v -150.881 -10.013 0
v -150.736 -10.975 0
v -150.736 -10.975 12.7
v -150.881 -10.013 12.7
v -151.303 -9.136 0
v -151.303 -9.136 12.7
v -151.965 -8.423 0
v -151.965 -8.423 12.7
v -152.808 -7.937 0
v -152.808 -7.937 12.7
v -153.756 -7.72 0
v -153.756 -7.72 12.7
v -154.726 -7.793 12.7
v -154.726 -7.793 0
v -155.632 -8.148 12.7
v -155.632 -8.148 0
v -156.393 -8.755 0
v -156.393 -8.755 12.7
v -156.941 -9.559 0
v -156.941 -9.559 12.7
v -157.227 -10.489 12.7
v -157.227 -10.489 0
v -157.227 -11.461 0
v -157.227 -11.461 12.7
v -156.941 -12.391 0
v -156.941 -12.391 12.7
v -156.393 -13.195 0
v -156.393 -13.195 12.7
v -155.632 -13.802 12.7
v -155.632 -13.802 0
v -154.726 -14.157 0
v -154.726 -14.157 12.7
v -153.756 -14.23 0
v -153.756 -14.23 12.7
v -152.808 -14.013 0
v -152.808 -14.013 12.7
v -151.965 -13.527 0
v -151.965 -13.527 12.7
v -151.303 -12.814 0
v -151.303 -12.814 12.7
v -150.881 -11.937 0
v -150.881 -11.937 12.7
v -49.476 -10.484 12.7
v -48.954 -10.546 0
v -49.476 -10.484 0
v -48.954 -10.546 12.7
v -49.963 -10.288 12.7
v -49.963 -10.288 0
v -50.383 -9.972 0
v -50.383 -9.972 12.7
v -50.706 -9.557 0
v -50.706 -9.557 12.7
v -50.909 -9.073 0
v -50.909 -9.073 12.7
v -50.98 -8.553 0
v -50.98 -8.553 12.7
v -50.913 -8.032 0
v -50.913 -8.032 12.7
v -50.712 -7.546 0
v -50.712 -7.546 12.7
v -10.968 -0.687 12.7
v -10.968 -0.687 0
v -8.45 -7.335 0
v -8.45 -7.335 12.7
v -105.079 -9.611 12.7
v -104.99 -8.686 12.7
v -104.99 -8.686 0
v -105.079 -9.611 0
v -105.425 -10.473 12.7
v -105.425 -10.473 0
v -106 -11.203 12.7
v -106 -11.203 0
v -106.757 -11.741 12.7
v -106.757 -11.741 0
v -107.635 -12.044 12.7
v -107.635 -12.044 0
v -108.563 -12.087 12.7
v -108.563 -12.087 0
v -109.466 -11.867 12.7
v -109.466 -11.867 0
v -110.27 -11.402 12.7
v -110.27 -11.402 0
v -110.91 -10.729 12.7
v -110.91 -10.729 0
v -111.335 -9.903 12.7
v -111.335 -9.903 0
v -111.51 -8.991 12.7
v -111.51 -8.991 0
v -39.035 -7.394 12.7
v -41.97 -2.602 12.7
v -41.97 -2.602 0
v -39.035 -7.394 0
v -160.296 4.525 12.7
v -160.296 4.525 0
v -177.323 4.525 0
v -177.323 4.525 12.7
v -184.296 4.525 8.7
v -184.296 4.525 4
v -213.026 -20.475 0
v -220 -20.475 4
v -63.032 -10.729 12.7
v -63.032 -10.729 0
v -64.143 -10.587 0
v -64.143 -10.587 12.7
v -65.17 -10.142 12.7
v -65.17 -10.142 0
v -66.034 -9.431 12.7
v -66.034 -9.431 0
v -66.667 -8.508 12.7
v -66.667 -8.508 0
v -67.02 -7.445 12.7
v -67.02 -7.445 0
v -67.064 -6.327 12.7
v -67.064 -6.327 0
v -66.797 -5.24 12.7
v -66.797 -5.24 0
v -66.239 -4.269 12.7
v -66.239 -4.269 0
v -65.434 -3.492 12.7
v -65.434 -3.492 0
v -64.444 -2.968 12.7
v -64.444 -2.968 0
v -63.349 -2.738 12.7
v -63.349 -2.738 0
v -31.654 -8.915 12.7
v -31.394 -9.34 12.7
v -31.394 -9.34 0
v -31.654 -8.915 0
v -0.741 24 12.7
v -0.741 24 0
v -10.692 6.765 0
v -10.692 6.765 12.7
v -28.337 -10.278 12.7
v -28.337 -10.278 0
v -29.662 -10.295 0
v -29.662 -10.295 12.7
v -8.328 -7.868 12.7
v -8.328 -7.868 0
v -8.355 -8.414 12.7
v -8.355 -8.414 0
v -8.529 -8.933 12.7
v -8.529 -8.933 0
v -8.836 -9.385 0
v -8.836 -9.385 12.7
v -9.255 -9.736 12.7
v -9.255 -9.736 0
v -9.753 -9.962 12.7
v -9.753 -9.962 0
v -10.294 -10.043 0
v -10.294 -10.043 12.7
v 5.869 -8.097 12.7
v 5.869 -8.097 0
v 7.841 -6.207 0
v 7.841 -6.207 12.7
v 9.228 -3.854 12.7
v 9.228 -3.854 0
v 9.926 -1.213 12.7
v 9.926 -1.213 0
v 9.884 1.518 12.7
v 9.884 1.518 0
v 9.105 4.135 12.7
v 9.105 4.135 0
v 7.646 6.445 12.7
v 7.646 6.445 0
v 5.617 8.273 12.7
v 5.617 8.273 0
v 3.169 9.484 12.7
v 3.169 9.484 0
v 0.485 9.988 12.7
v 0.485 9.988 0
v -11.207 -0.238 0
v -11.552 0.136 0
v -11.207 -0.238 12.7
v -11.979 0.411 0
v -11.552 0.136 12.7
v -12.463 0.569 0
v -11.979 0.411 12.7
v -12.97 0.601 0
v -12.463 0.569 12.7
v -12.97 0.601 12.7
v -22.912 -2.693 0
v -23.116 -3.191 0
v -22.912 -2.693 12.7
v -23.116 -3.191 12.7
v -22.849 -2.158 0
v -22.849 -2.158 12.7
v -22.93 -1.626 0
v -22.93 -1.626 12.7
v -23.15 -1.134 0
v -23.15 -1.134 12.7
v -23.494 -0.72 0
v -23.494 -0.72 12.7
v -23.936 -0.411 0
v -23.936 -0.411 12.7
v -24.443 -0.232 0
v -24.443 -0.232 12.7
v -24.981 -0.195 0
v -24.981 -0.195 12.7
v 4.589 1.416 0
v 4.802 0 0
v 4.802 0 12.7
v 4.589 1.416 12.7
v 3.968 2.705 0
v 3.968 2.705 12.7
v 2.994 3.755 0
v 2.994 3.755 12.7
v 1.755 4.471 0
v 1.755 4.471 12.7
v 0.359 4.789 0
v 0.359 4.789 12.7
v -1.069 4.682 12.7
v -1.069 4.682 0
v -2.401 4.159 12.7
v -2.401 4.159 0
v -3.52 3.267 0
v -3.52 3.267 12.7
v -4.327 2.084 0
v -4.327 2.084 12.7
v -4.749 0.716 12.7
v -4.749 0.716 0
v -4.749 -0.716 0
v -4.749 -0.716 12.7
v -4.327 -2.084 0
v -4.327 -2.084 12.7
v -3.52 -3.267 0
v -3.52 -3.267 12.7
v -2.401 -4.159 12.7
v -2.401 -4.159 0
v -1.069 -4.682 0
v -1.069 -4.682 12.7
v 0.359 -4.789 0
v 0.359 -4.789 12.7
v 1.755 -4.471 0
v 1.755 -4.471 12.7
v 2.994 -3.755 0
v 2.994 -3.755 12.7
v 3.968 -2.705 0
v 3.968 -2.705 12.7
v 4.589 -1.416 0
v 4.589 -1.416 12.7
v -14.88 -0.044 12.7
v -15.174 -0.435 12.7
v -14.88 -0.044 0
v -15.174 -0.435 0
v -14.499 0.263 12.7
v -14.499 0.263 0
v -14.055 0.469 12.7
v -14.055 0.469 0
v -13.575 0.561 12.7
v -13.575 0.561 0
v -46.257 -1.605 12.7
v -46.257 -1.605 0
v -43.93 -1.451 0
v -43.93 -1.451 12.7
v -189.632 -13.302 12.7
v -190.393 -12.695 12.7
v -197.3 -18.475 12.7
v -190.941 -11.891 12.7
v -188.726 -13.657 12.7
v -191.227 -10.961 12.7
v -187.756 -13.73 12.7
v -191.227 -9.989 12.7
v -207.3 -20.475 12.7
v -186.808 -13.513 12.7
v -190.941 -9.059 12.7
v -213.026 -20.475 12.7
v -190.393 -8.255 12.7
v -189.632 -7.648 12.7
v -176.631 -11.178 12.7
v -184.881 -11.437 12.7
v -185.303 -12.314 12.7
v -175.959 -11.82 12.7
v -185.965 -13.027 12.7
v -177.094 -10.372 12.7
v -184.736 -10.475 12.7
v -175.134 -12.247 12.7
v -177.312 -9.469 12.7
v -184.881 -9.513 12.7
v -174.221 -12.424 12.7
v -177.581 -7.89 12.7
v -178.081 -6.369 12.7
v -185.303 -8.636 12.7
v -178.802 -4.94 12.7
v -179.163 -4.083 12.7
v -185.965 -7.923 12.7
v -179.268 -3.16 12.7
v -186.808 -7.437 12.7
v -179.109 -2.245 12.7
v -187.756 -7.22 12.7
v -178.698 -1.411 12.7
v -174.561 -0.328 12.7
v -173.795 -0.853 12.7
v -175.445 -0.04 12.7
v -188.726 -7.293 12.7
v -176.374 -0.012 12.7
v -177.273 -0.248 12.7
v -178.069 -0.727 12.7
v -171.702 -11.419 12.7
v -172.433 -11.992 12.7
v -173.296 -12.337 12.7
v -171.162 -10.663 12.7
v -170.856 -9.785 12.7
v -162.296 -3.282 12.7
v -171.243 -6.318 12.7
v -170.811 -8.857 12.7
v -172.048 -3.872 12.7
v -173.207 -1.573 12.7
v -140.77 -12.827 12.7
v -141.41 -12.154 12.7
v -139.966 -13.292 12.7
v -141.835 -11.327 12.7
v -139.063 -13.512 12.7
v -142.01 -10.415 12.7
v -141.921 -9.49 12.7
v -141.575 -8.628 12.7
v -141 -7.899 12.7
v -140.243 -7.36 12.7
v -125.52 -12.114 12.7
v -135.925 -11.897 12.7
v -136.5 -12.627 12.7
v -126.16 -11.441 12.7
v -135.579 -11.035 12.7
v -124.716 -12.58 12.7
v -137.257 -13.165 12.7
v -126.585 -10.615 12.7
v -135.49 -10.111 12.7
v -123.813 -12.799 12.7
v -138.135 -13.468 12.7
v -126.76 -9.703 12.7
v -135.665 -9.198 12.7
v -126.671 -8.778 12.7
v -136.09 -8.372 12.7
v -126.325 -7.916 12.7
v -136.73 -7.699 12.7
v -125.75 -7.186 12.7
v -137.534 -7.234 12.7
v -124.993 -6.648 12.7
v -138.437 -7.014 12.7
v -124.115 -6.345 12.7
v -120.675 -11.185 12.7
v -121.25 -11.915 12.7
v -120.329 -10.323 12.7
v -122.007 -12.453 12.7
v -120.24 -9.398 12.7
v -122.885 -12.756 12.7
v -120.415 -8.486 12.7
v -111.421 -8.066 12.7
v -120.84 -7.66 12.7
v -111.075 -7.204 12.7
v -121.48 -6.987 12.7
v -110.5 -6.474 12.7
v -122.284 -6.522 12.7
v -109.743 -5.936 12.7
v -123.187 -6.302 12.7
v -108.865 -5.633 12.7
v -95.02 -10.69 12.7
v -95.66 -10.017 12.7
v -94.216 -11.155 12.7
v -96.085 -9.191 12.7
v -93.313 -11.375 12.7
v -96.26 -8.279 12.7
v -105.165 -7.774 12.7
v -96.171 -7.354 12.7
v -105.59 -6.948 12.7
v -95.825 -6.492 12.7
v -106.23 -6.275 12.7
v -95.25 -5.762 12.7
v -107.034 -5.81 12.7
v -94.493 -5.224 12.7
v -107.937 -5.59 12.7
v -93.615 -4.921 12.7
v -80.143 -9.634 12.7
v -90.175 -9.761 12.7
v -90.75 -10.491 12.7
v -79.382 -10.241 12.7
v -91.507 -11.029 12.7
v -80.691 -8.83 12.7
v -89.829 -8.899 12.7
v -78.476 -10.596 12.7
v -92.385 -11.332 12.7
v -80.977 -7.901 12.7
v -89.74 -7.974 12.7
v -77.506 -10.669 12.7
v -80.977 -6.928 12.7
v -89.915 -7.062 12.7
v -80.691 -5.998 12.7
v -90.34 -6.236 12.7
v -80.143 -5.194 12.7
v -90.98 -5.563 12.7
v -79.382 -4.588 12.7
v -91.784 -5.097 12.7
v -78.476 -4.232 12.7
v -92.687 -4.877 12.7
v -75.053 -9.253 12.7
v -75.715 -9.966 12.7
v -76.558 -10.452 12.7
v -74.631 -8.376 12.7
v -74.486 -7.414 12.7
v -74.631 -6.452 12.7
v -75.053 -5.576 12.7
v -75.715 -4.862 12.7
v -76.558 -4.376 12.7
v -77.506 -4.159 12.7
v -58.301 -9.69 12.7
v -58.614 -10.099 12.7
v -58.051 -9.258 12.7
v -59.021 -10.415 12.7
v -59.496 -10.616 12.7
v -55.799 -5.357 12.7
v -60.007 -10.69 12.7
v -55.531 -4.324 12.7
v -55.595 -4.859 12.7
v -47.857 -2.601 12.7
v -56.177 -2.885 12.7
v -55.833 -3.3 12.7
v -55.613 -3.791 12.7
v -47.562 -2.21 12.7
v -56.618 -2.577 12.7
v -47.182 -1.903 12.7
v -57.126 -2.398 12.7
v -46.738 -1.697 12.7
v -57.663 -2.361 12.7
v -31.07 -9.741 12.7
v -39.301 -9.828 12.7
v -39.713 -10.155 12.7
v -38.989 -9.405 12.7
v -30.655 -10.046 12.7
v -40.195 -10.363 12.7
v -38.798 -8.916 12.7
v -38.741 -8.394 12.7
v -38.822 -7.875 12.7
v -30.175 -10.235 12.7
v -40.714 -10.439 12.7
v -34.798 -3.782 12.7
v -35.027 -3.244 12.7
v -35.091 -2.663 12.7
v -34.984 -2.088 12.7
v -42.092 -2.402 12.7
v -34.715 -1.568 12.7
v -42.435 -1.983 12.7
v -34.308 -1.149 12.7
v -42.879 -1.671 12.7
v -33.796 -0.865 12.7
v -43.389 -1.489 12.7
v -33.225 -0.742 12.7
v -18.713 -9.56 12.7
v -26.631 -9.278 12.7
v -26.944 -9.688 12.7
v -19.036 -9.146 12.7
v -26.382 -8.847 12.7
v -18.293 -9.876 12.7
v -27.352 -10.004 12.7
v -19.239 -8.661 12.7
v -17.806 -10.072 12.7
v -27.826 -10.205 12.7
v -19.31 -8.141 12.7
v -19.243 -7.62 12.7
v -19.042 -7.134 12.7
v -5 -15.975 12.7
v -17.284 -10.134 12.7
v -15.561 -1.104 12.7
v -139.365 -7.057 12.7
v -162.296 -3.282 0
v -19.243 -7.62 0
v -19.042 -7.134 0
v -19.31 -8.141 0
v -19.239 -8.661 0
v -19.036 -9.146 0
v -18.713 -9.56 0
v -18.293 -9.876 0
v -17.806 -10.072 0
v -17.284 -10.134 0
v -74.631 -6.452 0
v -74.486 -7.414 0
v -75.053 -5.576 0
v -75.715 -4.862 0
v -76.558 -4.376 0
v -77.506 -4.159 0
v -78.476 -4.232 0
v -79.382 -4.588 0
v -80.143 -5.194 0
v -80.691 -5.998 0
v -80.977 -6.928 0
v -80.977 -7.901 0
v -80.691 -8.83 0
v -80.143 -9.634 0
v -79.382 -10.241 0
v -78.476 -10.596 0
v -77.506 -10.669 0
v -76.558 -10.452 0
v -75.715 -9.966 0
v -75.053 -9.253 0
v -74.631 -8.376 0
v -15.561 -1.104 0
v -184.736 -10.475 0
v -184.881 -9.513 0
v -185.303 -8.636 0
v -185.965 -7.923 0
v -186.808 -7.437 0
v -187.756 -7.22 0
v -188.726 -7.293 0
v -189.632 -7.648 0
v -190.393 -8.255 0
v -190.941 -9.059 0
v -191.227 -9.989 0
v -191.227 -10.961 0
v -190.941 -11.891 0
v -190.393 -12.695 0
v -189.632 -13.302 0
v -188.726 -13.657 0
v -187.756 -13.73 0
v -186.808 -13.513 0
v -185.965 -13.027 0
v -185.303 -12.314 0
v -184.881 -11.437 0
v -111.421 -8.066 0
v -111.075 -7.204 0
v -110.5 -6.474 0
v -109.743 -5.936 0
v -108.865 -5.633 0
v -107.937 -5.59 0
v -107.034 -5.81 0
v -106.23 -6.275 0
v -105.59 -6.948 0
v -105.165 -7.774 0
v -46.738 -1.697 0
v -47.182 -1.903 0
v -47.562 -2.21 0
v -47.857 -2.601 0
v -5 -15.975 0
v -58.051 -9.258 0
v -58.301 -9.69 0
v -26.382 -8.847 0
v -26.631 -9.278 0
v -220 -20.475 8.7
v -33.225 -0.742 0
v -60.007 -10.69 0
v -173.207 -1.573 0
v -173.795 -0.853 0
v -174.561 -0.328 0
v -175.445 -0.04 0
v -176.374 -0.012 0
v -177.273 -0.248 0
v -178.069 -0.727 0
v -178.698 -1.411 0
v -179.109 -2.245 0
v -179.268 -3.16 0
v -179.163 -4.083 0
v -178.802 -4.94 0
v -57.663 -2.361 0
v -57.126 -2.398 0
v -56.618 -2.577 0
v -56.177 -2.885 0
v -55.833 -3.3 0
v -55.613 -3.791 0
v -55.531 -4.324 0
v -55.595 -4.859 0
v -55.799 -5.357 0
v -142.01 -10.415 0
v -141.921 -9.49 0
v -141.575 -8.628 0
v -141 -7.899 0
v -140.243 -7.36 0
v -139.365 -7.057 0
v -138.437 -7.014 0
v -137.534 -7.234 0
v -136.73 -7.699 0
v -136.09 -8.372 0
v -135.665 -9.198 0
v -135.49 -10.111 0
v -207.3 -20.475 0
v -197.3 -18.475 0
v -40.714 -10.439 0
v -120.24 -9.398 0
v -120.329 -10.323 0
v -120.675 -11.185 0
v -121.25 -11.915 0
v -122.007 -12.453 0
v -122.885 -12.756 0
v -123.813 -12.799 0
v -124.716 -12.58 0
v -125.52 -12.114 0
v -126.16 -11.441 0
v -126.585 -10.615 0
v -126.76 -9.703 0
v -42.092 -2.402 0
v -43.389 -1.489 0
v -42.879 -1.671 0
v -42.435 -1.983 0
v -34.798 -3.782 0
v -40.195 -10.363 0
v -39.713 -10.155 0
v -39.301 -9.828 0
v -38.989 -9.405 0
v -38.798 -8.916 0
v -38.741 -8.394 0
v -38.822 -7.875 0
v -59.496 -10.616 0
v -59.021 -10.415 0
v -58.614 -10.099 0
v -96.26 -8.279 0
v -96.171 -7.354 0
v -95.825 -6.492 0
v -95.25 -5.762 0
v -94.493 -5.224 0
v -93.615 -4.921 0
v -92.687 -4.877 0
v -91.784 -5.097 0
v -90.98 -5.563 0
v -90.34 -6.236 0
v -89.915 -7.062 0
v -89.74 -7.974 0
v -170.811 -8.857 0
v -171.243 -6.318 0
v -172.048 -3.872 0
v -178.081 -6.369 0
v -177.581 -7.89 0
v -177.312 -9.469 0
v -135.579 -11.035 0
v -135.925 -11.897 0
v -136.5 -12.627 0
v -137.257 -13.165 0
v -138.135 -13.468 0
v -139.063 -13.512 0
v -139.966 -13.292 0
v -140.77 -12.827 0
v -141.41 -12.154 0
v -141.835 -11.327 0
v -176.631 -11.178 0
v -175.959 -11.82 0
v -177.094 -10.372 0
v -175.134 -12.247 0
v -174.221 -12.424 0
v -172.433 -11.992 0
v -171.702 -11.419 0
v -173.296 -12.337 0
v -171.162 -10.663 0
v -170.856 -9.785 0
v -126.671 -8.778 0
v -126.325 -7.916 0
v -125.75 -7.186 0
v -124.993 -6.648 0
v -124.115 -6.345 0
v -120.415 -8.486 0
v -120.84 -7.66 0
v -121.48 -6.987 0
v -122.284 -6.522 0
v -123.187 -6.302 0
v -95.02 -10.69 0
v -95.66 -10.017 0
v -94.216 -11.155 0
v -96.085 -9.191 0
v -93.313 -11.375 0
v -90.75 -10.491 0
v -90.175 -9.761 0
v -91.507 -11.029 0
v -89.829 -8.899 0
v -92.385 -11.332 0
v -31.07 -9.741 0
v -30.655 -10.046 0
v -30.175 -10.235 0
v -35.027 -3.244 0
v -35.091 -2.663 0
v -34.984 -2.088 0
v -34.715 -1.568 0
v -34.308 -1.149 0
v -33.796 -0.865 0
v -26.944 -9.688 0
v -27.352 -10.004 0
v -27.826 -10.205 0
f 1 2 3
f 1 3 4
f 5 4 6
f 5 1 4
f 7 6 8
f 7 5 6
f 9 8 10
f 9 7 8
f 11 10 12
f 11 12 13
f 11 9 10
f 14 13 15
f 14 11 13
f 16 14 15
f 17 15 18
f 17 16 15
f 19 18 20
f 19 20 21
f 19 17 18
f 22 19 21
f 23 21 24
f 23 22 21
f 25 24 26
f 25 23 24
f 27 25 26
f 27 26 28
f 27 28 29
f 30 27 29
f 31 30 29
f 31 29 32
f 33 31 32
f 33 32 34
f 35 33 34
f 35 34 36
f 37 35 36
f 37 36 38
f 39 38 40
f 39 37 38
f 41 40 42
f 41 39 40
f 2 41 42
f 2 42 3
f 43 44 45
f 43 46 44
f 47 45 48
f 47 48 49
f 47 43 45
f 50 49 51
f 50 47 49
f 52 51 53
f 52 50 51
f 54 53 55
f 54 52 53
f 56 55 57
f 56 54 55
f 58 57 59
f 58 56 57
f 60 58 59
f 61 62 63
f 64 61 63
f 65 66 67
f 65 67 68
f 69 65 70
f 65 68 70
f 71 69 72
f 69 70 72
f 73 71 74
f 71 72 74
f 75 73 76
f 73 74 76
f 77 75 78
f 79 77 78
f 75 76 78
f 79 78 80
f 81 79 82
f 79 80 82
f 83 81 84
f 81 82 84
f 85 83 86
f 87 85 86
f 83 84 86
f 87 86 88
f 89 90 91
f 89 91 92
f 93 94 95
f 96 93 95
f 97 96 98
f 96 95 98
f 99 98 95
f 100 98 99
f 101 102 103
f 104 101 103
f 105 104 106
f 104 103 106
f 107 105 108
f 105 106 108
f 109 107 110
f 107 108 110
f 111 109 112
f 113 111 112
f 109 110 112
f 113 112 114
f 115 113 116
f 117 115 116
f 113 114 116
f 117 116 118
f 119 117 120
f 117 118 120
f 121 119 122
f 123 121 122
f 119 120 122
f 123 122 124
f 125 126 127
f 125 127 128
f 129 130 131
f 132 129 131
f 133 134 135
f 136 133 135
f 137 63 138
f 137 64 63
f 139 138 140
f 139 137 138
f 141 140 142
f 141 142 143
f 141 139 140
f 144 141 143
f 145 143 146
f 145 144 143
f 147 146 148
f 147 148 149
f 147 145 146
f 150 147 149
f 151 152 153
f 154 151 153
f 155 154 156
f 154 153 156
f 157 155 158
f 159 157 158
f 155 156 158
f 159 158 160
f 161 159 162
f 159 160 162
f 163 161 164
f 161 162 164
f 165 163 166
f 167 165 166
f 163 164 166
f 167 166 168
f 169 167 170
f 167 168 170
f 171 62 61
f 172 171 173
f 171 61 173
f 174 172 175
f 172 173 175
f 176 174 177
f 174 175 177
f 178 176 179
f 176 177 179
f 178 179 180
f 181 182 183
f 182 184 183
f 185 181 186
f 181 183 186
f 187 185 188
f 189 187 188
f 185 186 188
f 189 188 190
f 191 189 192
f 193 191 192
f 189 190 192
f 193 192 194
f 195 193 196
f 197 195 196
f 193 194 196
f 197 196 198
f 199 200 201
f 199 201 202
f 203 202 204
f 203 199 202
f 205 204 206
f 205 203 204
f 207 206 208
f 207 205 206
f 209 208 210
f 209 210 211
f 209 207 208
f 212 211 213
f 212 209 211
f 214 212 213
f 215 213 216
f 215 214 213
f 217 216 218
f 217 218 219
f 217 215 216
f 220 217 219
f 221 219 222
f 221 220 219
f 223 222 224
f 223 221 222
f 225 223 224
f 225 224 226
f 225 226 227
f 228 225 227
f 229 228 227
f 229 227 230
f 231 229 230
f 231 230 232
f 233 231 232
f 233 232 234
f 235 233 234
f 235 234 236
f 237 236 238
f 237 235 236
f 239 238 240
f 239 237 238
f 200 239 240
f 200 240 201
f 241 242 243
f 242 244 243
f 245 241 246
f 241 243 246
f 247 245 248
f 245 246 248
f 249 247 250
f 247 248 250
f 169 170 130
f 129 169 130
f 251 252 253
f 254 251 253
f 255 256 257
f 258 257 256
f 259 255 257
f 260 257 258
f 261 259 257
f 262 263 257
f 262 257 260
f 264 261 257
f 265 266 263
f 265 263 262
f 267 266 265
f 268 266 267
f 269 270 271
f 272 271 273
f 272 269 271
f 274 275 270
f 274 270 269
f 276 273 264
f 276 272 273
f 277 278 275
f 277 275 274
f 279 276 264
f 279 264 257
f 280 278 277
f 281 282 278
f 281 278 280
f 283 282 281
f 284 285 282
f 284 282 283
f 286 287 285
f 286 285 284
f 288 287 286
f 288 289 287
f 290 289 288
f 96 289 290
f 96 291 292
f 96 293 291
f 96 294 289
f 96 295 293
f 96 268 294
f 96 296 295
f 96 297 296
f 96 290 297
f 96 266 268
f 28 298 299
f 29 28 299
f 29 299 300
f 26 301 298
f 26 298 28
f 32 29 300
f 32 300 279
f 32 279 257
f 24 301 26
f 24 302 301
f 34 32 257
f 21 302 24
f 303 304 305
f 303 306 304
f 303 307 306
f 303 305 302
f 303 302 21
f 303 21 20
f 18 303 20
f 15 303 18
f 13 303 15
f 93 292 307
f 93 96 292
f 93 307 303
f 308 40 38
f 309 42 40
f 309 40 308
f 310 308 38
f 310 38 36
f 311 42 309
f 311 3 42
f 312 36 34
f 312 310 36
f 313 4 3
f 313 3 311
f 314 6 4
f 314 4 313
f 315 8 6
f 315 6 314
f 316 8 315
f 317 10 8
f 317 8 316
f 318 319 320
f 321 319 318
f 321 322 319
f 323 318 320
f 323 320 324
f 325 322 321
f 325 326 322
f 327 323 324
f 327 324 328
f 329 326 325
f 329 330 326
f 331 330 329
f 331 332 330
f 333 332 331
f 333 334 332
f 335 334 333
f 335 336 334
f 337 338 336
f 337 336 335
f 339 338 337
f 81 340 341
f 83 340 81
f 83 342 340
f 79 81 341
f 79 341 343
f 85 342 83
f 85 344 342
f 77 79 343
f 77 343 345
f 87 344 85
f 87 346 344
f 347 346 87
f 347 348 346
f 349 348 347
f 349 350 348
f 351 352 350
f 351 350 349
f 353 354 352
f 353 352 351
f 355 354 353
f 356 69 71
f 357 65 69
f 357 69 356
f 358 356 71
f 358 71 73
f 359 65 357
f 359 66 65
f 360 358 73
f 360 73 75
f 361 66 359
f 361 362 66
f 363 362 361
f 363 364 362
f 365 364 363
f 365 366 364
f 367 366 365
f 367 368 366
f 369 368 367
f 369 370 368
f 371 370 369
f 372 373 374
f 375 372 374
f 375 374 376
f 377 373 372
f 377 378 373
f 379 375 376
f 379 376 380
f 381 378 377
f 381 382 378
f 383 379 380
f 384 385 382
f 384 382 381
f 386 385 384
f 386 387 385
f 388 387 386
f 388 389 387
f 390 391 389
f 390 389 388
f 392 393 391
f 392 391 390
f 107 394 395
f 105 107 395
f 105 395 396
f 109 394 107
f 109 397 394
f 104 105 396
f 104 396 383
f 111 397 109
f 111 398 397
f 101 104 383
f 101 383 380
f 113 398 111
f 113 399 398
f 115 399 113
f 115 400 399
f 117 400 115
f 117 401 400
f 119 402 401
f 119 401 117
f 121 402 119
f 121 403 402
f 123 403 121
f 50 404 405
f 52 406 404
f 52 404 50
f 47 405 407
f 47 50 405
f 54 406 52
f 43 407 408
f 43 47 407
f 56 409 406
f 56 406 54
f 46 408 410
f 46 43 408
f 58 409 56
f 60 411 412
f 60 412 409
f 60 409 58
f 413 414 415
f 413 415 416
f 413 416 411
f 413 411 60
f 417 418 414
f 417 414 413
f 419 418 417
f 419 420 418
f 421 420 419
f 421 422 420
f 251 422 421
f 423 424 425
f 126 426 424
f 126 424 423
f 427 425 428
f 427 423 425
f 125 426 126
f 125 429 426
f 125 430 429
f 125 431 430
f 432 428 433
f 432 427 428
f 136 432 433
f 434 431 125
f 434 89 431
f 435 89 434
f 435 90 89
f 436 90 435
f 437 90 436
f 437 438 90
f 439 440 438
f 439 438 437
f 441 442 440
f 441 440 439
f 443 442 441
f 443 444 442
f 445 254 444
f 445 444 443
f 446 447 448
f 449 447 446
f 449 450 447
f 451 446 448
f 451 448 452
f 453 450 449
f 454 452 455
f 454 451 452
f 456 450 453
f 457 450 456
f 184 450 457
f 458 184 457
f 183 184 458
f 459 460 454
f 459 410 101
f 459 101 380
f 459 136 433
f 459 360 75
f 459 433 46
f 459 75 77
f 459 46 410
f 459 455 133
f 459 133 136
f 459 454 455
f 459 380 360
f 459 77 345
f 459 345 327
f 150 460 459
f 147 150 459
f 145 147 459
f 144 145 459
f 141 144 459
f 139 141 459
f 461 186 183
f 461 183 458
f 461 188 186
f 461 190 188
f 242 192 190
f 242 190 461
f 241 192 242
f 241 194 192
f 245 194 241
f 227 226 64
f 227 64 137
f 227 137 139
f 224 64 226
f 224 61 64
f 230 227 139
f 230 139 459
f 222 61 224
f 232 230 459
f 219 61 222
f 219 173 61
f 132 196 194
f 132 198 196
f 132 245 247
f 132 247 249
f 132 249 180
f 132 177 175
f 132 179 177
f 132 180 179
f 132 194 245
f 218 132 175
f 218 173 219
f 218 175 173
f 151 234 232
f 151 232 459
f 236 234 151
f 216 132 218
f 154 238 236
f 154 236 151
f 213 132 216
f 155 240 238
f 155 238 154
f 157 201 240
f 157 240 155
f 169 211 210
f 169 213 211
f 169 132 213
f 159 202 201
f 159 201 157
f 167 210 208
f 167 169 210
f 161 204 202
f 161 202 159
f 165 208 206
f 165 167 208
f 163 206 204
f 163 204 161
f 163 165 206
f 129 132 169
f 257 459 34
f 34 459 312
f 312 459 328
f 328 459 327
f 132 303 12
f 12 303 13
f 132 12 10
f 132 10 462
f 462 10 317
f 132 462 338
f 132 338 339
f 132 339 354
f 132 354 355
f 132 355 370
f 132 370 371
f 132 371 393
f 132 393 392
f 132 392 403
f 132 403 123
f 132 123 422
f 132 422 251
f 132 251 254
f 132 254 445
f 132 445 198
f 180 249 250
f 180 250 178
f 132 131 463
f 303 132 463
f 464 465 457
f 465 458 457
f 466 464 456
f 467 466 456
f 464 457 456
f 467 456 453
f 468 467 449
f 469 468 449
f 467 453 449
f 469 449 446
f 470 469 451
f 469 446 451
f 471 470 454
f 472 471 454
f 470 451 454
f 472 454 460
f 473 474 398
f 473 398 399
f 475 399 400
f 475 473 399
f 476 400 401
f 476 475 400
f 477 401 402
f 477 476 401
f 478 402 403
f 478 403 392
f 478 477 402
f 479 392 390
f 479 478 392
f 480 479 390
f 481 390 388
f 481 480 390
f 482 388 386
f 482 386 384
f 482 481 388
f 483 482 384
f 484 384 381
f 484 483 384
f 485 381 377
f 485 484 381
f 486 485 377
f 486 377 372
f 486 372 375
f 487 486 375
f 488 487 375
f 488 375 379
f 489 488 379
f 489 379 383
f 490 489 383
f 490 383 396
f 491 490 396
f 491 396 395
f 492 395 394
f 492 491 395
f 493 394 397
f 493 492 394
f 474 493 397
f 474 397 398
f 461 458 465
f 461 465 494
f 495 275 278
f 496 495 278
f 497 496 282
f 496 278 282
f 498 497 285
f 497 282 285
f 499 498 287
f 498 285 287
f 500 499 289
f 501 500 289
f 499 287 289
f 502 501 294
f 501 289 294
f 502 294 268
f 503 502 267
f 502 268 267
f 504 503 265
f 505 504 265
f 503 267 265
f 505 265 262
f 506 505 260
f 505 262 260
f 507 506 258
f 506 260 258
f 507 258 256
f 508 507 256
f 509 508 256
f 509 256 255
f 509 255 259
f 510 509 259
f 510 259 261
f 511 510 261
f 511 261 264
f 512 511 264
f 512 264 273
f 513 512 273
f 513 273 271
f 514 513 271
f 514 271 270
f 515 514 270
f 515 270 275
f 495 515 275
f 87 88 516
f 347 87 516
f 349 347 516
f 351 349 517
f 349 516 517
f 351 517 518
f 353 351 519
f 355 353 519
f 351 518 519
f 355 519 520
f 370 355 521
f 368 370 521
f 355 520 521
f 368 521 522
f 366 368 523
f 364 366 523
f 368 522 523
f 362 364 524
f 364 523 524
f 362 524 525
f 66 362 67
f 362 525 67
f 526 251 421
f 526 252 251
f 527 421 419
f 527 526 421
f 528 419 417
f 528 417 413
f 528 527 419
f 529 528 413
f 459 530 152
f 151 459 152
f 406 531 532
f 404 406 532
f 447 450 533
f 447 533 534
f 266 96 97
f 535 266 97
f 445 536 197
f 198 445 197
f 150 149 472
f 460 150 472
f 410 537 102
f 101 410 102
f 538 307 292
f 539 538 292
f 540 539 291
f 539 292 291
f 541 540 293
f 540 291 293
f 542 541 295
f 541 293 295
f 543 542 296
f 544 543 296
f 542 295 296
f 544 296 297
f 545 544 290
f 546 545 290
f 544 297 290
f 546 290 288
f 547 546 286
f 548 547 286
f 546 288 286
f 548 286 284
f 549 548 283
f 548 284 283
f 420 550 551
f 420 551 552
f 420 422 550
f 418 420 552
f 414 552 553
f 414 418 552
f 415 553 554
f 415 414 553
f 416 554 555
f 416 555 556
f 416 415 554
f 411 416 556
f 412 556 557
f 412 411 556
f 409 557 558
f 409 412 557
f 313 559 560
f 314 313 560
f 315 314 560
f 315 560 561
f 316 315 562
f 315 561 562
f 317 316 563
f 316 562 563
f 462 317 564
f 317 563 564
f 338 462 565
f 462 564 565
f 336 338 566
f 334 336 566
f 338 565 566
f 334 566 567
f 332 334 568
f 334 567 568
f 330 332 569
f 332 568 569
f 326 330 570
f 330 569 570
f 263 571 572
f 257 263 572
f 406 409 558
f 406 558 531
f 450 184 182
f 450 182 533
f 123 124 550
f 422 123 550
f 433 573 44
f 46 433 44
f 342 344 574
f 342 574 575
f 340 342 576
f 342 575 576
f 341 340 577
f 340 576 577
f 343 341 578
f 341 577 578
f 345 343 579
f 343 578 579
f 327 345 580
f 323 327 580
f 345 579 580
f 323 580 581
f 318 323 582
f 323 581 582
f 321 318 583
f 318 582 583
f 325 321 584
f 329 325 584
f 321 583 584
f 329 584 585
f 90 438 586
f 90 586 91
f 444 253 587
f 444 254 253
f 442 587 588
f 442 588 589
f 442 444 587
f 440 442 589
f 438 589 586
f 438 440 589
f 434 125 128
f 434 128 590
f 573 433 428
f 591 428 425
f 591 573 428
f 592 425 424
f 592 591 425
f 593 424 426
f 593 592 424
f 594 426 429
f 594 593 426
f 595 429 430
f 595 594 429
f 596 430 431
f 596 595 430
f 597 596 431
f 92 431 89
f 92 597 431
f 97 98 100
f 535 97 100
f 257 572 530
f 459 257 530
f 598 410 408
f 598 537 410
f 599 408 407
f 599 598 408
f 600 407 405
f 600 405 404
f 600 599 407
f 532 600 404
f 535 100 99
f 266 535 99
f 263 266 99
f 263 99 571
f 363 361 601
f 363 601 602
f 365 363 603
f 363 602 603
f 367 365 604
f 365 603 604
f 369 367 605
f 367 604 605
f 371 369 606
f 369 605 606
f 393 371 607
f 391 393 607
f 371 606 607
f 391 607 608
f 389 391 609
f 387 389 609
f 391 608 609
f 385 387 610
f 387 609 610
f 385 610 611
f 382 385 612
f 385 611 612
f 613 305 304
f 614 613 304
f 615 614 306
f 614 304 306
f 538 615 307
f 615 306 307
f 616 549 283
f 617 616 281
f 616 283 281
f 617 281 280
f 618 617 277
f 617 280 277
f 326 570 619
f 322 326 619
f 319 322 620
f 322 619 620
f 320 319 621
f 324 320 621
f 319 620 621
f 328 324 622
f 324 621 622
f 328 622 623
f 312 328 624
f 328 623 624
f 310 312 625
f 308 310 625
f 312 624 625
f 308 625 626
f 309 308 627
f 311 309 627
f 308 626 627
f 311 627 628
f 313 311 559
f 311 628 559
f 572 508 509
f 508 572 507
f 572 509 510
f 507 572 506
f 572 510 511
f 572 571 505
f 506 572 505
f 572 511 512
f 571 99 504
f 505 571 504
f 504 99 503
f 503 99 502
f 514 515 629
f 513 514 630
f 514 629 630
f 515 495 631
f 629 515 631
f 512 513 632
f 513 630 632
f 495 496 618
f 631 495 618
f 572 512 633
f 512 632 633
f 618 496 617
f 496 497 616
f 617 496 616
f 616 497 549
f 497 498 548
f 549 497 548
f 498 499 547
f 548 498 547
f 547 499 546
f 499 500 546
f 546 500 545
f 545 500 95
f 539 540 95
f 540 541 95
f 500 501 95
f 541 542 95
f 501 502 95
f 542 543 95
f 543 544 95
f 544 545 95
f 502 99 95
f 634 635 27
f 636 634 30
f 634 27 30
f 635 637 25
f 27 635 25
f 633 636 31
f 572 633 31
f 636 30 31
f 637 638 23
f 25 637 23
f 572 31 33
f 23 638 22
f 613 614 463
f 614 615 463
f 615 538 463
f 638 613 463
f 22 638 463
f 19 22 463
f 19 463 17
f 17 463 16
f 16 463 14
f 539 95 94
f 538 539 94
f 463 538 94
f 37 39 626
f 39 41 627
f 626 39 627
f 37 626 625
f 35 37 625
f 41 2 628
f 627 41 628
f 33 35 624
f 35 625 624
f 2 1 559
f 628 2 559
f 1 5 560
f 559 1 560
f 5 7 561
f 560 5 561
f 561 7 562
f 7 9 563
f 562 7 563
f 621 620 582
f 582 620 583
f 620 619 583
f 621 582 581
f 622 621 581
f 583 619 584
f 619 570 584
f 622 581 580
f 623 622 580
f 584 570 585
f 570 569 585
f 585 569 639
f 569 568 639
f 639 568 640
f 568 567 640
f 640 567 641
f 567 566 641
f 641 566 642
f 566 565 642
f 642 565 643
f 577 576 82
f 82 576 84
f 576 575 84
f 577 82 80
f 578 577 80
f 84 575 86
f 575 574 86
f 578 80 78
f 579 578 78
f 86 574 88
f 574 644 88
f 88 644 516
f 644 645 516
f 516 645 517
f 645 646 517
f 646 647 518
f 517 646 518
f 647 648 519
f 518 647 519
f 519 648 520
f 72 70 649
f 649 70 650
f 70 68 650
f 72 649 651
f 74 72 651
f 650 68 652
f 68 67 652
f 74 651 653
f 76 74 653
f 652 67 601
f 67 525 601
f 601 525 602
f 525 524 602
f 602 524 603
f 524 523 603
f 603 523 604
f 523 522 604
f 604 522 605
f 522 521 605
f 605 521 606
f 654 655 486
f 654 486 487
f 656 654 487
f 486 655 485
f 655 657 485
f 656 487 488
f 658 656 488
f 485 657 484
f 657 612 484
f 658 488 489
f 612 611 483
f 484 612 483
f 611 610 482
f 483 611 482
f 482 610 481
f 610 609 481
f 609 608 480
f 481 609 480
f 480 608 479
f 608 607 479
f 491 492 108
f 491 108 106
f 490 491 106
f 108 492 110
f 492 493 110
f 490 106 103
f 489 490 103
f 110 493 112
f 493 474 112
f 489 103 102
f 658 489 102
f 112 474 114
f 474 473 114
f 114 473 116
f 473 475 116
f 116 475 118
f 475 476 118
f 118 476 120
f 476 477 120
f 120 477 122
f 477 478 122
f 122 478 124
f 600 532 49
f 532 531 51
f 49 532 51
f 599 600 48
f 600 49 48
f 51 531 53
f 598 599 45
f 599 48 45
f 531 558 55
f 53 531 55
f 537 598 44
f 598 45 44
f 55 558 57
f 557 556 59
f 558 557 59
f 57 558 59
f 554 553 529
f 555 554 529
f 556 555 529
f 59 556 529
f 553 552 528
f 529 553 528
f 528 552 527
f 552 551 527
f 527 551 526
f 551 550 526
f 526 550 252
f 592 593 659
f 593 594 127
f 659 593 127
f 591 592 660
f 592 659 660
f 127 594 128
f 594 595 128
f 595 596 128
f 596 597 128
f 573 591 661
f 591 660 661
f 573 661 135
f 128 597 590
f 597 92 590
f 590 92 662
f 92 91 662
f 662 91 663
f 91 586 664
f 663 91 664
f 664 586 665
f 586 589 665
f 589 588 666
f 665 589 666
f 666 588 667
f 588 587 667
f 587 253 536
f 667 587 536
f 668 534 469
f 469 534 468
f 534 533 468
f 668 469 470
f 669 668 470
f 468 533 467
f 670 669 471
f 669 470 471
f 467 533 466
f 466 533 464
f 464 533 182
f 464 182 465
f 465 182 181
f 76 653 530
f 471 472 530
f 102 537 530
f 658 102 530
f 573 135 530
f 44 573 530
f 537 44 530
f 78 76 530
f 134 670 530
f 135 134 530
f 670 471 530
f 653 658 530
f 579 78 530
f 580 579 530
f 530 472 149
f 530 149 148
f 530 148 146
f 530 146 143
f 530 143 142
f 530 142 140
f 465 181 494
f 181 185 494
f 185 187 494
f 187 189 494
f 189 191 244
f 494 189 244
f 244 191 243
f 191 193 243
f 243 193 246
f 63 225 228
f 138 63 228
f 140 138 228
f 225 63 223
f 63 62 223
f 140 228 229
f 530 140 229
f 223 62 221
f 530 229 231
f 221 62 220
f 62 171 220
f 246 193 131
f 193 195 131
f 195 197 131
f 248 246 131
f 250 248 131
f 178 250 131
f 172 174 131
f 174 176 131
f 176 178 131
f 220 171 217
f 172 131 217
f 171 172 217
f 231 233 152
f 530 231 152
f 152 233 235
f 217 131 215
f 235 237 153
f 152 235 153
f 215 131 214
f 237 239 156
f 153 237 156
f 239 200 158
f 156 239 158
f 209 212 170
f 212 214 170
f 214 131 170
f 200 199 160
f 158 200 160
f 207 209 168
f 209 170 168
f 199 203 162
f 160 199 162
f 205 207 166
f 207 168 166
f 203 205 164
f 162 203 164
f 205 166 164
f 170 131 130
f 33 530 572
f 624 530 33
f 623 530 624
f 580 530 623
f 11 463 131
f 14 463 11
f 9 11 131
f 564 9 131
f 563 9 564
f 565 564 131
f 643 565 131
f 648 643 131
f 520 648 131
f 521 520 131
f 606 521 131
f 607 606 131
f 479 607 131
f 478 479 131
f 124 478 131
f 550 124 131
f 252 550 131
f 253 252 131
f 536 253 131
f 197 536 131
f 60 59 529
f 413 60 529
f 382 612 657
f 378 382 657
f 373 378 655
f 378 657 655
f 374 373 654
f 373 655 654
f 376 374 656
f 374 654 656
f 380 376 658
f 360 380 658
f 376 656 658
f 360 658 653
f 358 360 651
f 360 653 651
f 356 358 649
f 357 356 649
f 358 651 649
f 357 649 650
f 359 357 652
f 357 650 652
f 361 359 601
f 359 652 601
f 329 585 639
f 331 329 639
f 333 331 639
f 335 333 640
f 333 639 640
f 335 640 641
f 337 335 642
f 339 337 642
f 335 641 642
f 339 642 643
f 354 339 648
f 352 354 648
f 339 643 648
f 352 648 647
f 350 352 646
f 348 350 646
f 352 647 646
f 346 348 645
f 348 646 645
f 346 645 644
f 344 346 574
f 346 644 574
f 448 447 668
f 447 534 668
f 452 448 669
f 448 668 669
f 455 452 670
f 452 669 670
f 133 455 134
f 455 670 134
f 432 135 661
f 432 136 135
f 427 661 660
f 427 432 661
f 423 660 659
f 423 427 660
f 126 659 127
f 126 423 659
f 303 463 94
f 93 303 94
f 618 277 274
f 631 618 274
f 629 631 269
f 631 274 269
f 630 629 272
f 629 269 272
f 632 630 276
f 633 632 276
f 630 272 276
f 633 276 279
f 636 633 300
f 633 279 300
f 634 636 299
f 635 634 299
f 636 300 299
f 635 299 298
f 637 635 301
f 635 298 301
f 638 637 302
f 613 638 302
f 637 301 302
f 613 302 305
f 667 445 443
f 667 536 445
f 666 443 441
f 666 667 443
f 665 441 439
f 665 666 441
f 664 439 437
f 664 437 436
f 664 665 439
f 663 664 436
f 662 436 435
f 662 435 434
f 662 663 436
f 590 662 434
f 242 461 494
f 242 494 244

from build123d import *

# Parameters (mm, degrees)
SKETCH1_R           = 3.2639
SKETCH1_R_2         = 4.8025
BOSS_EXTRUDE1_DEPTH = 12.7
EXTRUDE_THIN1_DEPTH = 12.7
FILLET1_R           = 2
SKETCH3_R           = 3.2639
CUT_EXTRUDE1_DEPTH  = 222.669325799
CHAMFER1_SIZE       = 4


with BuildPart() as part:
    # Sketch1 → Boss-Extrude1 (new body)
    with BuildSketch(Plane.XY):
        with BuildLine():
            Line((-220, -20.475), (-207.3, -20.475))
            Line((-207.3, -20.475), (-197.3, -18.475))
            Line((-197.3, -18.475), (-5, -15.975))
            Line((-5, -15.975), (5.868885021, -8.096677628))
            ThreePointArc((5.868885021, -8.096677628), (9.584297561, 2.85328587), (0.484930071, 9.988235221))
            Line((0.484930071, 9.988235221), (-0.740940503, 24))
            Line((-0.740940503, 24), (-10.691733631, 6.764720727))
            Line((-10.691733631, 6.764720727), (-162.296299831, -3.282137227))
            Line((-162.296299831, -3.282137227), (-160.296299831, 4.525))
            Line((-160.296299831, 4.525), (-184.296299831, 4.525))
            Line((-184.296299831, 4.525), (-220, -20.475))
        make_face()
        with Locations((-154, -10.975)):
            Circle(SKETCH1_R, mode=Mode.SUBTRACT)
        with BuildLine():
            ThreePointArc((-135.489653222, -10.110575335), (-138.597743308, -13.523178805), (-142.010346778, -10.415088719))
            ThreePointArc((-142.010346778, -10.415088719), (-138.902256692, -7.00248525), (-135.489653222, -10.110575335))
        make_face(mode=Mode.SUBTRACT)
        with BuildLine():
            ThreePointArc((-120.239653222, -9.398407362), (-123.347743308, -12.811010832), (-126.760346778, -9.702920746))
            ThreePointArc((-126.760346778, -9.702920746), (-123.652256692, -6.290317277), (-120.239653222, -9.398407362))
        make_face(mode=Mode.SUBTRACT)
        with BuildLine():
            ThreePointArc((-104.989653222, -8.686239389), (-108.097743308, -12.098842859), (-111.510346778, -8.990752773))
            ThreePointArc((-111.510346778, -8.990752773), (-108.402256692, -5.578149304), (-104.989653222, -8.686239389))
        make_face(mode=Mode.SUBTRACT)
        with BuildLine():
            ThreePointArc((-89.739653222, -7.974071416), (-92.847743308, -11.386674886), (-96.260346778, -8.2785848))
            ThreePointArc((-96.260346778, -8.2785848), (-93.152256692, -4.865981331), (-89.739653222, -7.974071416))
        make_face(mode=Mode.SUBTRACT)
        with Locations((-77.75, -7.414160135)):
            Circle(SKETCH1_R, mode=Mode.SUBTRACT)
        with BuildLine():
            ThreePointArc((-63.032372648, -10.728944003), (-67.081236547, -6.887586999), (-63.348870778, -2.738036629))
            Line((-63.348870778, -2.738036629), (-11.492502478, 0.698492886))
            Line((-11.492502478, 0.698492886), (-7.437965658, -10.006187802))
            Line((-7.437965658, -10.006187802), (-63.032372648, -10.728944003))
        make_face(mode=Mode.SUBTRACT)
        Circle(SKETCH1_R_2, mode=Mode.SUBTRACT)
    extrude(amount=BOSS_EXTRUDE1_DEPTH)

    # Sketch2 → Extrude-Thin1 (add)
    with BuildSketch(Plane.XY.offset(12.7)):
        Polygon((-18.82367626, 4.244152852), (-20.32367626, 1.646076641), (-26.38156986, -8.846502861), (-27.88156986, -11.444579073), (-23.11843014, -14.194579073), (-21.61843014, -11.596502861), (-15.560536539, -1.103923359), (-14.060536539, 1.494152852), align=None)
        Polygon((-29.564922949, -12.326360556), (-31.654014309, -8.915246766), (-37.279649193, 0.270412174), (-39.368740553, 3.681525964), (-44.059022015, 0.809025344), (-41.969930654, -2.602088446), (-36.34429577, -11.787747387), (-34.25520441, -15.198861177), align=None)
        Polygon((-51.506359784, 2.078266381), (-53.006359784, -0.51980983), (-58.05148802, -9.258228266), (-59.55148802, -11.856304478), (-54.7883483, -14.606304478), (-53.2883483, -12.008228266), (-48.243220063, -3.26980983), (-46.743220063, -0.671733619), align=None)
    extrude(amount=-EXTRUDE_THIN1_DEPTH)

    # Fillet1
    fillet1_edges = [part.edges().sort_by_distance(p)[0] for p in [
        (-37.198435549, -10.393089387, 6.35),
        (-42.723767146, -1.371207834, 6.35),
        (-30.79987453, -10.309904766, 6.35),
        (-36.525812701, -0.960468438, 6.35),
        (-58.869359177, -10.674822663, 6.35),
        (-53.926545163, -2.113617659, 6.35),
        (-52.470477143, -10.591633869, 6.35),
        (-47.323034685, -1.676002002, 6.35),
        (-7.437965658, -10.006187802, 6.35),
        (-11.492502478, 0.698492886, 6.35),
        (-14.640351161, 0.489884469, 6.35),
        (-21.243861639, 0.052268813, 6.35),
        (-27.199441017, -10.263097258, 6.35),
        (-20.800558983, -10.179908464, 6.35),
    ]]
    fillet(fillet1_edges, radius=FILLET1_R)

    # Sketch3 → Cut-Extrude1 (cut, through all)
    with BuildSketch(Plane.XY.offset(12.7)):
        with Locations((-188, -10.475)):
            Circle(SKETCH3_R)
        with BuildLine():
            ThreePointArc((-170.811018785, -8.85662125), (-171.599559812, -5.080022092), (-173.207049233, -1.57281866))
            ThreePointArc((-173.207049233, -1.57281866), (-177.688057419, -0.458809846), (-178.802066233, -4.939818032))
            ThreePointArc((-178.802066233, -4.939818032), (-177.802564412, -7.120520542), (-177.31226682, -9.468727432))
            ThreePointArc((-177.31226682, -9.468727432), (-173.755589711, -12.413298359), (-170.811018785, -8.85662125))
        make_face()
    extrude(amount=-CUT_EXTRUDE1_DEPTH, mode=Mode.SUBTRACT)

    # Chamfer1
    chamfer1_edges = [part.edges().sort_by_distance(p)[0] for p in [
        (-202.148149916, -7.975, 0),
        (-202.148149916, -7.975, 12.7),
    ]]
    chamfer(chamfer1_edges, length=CHAMFER1_SIZE)


solid = part.part
